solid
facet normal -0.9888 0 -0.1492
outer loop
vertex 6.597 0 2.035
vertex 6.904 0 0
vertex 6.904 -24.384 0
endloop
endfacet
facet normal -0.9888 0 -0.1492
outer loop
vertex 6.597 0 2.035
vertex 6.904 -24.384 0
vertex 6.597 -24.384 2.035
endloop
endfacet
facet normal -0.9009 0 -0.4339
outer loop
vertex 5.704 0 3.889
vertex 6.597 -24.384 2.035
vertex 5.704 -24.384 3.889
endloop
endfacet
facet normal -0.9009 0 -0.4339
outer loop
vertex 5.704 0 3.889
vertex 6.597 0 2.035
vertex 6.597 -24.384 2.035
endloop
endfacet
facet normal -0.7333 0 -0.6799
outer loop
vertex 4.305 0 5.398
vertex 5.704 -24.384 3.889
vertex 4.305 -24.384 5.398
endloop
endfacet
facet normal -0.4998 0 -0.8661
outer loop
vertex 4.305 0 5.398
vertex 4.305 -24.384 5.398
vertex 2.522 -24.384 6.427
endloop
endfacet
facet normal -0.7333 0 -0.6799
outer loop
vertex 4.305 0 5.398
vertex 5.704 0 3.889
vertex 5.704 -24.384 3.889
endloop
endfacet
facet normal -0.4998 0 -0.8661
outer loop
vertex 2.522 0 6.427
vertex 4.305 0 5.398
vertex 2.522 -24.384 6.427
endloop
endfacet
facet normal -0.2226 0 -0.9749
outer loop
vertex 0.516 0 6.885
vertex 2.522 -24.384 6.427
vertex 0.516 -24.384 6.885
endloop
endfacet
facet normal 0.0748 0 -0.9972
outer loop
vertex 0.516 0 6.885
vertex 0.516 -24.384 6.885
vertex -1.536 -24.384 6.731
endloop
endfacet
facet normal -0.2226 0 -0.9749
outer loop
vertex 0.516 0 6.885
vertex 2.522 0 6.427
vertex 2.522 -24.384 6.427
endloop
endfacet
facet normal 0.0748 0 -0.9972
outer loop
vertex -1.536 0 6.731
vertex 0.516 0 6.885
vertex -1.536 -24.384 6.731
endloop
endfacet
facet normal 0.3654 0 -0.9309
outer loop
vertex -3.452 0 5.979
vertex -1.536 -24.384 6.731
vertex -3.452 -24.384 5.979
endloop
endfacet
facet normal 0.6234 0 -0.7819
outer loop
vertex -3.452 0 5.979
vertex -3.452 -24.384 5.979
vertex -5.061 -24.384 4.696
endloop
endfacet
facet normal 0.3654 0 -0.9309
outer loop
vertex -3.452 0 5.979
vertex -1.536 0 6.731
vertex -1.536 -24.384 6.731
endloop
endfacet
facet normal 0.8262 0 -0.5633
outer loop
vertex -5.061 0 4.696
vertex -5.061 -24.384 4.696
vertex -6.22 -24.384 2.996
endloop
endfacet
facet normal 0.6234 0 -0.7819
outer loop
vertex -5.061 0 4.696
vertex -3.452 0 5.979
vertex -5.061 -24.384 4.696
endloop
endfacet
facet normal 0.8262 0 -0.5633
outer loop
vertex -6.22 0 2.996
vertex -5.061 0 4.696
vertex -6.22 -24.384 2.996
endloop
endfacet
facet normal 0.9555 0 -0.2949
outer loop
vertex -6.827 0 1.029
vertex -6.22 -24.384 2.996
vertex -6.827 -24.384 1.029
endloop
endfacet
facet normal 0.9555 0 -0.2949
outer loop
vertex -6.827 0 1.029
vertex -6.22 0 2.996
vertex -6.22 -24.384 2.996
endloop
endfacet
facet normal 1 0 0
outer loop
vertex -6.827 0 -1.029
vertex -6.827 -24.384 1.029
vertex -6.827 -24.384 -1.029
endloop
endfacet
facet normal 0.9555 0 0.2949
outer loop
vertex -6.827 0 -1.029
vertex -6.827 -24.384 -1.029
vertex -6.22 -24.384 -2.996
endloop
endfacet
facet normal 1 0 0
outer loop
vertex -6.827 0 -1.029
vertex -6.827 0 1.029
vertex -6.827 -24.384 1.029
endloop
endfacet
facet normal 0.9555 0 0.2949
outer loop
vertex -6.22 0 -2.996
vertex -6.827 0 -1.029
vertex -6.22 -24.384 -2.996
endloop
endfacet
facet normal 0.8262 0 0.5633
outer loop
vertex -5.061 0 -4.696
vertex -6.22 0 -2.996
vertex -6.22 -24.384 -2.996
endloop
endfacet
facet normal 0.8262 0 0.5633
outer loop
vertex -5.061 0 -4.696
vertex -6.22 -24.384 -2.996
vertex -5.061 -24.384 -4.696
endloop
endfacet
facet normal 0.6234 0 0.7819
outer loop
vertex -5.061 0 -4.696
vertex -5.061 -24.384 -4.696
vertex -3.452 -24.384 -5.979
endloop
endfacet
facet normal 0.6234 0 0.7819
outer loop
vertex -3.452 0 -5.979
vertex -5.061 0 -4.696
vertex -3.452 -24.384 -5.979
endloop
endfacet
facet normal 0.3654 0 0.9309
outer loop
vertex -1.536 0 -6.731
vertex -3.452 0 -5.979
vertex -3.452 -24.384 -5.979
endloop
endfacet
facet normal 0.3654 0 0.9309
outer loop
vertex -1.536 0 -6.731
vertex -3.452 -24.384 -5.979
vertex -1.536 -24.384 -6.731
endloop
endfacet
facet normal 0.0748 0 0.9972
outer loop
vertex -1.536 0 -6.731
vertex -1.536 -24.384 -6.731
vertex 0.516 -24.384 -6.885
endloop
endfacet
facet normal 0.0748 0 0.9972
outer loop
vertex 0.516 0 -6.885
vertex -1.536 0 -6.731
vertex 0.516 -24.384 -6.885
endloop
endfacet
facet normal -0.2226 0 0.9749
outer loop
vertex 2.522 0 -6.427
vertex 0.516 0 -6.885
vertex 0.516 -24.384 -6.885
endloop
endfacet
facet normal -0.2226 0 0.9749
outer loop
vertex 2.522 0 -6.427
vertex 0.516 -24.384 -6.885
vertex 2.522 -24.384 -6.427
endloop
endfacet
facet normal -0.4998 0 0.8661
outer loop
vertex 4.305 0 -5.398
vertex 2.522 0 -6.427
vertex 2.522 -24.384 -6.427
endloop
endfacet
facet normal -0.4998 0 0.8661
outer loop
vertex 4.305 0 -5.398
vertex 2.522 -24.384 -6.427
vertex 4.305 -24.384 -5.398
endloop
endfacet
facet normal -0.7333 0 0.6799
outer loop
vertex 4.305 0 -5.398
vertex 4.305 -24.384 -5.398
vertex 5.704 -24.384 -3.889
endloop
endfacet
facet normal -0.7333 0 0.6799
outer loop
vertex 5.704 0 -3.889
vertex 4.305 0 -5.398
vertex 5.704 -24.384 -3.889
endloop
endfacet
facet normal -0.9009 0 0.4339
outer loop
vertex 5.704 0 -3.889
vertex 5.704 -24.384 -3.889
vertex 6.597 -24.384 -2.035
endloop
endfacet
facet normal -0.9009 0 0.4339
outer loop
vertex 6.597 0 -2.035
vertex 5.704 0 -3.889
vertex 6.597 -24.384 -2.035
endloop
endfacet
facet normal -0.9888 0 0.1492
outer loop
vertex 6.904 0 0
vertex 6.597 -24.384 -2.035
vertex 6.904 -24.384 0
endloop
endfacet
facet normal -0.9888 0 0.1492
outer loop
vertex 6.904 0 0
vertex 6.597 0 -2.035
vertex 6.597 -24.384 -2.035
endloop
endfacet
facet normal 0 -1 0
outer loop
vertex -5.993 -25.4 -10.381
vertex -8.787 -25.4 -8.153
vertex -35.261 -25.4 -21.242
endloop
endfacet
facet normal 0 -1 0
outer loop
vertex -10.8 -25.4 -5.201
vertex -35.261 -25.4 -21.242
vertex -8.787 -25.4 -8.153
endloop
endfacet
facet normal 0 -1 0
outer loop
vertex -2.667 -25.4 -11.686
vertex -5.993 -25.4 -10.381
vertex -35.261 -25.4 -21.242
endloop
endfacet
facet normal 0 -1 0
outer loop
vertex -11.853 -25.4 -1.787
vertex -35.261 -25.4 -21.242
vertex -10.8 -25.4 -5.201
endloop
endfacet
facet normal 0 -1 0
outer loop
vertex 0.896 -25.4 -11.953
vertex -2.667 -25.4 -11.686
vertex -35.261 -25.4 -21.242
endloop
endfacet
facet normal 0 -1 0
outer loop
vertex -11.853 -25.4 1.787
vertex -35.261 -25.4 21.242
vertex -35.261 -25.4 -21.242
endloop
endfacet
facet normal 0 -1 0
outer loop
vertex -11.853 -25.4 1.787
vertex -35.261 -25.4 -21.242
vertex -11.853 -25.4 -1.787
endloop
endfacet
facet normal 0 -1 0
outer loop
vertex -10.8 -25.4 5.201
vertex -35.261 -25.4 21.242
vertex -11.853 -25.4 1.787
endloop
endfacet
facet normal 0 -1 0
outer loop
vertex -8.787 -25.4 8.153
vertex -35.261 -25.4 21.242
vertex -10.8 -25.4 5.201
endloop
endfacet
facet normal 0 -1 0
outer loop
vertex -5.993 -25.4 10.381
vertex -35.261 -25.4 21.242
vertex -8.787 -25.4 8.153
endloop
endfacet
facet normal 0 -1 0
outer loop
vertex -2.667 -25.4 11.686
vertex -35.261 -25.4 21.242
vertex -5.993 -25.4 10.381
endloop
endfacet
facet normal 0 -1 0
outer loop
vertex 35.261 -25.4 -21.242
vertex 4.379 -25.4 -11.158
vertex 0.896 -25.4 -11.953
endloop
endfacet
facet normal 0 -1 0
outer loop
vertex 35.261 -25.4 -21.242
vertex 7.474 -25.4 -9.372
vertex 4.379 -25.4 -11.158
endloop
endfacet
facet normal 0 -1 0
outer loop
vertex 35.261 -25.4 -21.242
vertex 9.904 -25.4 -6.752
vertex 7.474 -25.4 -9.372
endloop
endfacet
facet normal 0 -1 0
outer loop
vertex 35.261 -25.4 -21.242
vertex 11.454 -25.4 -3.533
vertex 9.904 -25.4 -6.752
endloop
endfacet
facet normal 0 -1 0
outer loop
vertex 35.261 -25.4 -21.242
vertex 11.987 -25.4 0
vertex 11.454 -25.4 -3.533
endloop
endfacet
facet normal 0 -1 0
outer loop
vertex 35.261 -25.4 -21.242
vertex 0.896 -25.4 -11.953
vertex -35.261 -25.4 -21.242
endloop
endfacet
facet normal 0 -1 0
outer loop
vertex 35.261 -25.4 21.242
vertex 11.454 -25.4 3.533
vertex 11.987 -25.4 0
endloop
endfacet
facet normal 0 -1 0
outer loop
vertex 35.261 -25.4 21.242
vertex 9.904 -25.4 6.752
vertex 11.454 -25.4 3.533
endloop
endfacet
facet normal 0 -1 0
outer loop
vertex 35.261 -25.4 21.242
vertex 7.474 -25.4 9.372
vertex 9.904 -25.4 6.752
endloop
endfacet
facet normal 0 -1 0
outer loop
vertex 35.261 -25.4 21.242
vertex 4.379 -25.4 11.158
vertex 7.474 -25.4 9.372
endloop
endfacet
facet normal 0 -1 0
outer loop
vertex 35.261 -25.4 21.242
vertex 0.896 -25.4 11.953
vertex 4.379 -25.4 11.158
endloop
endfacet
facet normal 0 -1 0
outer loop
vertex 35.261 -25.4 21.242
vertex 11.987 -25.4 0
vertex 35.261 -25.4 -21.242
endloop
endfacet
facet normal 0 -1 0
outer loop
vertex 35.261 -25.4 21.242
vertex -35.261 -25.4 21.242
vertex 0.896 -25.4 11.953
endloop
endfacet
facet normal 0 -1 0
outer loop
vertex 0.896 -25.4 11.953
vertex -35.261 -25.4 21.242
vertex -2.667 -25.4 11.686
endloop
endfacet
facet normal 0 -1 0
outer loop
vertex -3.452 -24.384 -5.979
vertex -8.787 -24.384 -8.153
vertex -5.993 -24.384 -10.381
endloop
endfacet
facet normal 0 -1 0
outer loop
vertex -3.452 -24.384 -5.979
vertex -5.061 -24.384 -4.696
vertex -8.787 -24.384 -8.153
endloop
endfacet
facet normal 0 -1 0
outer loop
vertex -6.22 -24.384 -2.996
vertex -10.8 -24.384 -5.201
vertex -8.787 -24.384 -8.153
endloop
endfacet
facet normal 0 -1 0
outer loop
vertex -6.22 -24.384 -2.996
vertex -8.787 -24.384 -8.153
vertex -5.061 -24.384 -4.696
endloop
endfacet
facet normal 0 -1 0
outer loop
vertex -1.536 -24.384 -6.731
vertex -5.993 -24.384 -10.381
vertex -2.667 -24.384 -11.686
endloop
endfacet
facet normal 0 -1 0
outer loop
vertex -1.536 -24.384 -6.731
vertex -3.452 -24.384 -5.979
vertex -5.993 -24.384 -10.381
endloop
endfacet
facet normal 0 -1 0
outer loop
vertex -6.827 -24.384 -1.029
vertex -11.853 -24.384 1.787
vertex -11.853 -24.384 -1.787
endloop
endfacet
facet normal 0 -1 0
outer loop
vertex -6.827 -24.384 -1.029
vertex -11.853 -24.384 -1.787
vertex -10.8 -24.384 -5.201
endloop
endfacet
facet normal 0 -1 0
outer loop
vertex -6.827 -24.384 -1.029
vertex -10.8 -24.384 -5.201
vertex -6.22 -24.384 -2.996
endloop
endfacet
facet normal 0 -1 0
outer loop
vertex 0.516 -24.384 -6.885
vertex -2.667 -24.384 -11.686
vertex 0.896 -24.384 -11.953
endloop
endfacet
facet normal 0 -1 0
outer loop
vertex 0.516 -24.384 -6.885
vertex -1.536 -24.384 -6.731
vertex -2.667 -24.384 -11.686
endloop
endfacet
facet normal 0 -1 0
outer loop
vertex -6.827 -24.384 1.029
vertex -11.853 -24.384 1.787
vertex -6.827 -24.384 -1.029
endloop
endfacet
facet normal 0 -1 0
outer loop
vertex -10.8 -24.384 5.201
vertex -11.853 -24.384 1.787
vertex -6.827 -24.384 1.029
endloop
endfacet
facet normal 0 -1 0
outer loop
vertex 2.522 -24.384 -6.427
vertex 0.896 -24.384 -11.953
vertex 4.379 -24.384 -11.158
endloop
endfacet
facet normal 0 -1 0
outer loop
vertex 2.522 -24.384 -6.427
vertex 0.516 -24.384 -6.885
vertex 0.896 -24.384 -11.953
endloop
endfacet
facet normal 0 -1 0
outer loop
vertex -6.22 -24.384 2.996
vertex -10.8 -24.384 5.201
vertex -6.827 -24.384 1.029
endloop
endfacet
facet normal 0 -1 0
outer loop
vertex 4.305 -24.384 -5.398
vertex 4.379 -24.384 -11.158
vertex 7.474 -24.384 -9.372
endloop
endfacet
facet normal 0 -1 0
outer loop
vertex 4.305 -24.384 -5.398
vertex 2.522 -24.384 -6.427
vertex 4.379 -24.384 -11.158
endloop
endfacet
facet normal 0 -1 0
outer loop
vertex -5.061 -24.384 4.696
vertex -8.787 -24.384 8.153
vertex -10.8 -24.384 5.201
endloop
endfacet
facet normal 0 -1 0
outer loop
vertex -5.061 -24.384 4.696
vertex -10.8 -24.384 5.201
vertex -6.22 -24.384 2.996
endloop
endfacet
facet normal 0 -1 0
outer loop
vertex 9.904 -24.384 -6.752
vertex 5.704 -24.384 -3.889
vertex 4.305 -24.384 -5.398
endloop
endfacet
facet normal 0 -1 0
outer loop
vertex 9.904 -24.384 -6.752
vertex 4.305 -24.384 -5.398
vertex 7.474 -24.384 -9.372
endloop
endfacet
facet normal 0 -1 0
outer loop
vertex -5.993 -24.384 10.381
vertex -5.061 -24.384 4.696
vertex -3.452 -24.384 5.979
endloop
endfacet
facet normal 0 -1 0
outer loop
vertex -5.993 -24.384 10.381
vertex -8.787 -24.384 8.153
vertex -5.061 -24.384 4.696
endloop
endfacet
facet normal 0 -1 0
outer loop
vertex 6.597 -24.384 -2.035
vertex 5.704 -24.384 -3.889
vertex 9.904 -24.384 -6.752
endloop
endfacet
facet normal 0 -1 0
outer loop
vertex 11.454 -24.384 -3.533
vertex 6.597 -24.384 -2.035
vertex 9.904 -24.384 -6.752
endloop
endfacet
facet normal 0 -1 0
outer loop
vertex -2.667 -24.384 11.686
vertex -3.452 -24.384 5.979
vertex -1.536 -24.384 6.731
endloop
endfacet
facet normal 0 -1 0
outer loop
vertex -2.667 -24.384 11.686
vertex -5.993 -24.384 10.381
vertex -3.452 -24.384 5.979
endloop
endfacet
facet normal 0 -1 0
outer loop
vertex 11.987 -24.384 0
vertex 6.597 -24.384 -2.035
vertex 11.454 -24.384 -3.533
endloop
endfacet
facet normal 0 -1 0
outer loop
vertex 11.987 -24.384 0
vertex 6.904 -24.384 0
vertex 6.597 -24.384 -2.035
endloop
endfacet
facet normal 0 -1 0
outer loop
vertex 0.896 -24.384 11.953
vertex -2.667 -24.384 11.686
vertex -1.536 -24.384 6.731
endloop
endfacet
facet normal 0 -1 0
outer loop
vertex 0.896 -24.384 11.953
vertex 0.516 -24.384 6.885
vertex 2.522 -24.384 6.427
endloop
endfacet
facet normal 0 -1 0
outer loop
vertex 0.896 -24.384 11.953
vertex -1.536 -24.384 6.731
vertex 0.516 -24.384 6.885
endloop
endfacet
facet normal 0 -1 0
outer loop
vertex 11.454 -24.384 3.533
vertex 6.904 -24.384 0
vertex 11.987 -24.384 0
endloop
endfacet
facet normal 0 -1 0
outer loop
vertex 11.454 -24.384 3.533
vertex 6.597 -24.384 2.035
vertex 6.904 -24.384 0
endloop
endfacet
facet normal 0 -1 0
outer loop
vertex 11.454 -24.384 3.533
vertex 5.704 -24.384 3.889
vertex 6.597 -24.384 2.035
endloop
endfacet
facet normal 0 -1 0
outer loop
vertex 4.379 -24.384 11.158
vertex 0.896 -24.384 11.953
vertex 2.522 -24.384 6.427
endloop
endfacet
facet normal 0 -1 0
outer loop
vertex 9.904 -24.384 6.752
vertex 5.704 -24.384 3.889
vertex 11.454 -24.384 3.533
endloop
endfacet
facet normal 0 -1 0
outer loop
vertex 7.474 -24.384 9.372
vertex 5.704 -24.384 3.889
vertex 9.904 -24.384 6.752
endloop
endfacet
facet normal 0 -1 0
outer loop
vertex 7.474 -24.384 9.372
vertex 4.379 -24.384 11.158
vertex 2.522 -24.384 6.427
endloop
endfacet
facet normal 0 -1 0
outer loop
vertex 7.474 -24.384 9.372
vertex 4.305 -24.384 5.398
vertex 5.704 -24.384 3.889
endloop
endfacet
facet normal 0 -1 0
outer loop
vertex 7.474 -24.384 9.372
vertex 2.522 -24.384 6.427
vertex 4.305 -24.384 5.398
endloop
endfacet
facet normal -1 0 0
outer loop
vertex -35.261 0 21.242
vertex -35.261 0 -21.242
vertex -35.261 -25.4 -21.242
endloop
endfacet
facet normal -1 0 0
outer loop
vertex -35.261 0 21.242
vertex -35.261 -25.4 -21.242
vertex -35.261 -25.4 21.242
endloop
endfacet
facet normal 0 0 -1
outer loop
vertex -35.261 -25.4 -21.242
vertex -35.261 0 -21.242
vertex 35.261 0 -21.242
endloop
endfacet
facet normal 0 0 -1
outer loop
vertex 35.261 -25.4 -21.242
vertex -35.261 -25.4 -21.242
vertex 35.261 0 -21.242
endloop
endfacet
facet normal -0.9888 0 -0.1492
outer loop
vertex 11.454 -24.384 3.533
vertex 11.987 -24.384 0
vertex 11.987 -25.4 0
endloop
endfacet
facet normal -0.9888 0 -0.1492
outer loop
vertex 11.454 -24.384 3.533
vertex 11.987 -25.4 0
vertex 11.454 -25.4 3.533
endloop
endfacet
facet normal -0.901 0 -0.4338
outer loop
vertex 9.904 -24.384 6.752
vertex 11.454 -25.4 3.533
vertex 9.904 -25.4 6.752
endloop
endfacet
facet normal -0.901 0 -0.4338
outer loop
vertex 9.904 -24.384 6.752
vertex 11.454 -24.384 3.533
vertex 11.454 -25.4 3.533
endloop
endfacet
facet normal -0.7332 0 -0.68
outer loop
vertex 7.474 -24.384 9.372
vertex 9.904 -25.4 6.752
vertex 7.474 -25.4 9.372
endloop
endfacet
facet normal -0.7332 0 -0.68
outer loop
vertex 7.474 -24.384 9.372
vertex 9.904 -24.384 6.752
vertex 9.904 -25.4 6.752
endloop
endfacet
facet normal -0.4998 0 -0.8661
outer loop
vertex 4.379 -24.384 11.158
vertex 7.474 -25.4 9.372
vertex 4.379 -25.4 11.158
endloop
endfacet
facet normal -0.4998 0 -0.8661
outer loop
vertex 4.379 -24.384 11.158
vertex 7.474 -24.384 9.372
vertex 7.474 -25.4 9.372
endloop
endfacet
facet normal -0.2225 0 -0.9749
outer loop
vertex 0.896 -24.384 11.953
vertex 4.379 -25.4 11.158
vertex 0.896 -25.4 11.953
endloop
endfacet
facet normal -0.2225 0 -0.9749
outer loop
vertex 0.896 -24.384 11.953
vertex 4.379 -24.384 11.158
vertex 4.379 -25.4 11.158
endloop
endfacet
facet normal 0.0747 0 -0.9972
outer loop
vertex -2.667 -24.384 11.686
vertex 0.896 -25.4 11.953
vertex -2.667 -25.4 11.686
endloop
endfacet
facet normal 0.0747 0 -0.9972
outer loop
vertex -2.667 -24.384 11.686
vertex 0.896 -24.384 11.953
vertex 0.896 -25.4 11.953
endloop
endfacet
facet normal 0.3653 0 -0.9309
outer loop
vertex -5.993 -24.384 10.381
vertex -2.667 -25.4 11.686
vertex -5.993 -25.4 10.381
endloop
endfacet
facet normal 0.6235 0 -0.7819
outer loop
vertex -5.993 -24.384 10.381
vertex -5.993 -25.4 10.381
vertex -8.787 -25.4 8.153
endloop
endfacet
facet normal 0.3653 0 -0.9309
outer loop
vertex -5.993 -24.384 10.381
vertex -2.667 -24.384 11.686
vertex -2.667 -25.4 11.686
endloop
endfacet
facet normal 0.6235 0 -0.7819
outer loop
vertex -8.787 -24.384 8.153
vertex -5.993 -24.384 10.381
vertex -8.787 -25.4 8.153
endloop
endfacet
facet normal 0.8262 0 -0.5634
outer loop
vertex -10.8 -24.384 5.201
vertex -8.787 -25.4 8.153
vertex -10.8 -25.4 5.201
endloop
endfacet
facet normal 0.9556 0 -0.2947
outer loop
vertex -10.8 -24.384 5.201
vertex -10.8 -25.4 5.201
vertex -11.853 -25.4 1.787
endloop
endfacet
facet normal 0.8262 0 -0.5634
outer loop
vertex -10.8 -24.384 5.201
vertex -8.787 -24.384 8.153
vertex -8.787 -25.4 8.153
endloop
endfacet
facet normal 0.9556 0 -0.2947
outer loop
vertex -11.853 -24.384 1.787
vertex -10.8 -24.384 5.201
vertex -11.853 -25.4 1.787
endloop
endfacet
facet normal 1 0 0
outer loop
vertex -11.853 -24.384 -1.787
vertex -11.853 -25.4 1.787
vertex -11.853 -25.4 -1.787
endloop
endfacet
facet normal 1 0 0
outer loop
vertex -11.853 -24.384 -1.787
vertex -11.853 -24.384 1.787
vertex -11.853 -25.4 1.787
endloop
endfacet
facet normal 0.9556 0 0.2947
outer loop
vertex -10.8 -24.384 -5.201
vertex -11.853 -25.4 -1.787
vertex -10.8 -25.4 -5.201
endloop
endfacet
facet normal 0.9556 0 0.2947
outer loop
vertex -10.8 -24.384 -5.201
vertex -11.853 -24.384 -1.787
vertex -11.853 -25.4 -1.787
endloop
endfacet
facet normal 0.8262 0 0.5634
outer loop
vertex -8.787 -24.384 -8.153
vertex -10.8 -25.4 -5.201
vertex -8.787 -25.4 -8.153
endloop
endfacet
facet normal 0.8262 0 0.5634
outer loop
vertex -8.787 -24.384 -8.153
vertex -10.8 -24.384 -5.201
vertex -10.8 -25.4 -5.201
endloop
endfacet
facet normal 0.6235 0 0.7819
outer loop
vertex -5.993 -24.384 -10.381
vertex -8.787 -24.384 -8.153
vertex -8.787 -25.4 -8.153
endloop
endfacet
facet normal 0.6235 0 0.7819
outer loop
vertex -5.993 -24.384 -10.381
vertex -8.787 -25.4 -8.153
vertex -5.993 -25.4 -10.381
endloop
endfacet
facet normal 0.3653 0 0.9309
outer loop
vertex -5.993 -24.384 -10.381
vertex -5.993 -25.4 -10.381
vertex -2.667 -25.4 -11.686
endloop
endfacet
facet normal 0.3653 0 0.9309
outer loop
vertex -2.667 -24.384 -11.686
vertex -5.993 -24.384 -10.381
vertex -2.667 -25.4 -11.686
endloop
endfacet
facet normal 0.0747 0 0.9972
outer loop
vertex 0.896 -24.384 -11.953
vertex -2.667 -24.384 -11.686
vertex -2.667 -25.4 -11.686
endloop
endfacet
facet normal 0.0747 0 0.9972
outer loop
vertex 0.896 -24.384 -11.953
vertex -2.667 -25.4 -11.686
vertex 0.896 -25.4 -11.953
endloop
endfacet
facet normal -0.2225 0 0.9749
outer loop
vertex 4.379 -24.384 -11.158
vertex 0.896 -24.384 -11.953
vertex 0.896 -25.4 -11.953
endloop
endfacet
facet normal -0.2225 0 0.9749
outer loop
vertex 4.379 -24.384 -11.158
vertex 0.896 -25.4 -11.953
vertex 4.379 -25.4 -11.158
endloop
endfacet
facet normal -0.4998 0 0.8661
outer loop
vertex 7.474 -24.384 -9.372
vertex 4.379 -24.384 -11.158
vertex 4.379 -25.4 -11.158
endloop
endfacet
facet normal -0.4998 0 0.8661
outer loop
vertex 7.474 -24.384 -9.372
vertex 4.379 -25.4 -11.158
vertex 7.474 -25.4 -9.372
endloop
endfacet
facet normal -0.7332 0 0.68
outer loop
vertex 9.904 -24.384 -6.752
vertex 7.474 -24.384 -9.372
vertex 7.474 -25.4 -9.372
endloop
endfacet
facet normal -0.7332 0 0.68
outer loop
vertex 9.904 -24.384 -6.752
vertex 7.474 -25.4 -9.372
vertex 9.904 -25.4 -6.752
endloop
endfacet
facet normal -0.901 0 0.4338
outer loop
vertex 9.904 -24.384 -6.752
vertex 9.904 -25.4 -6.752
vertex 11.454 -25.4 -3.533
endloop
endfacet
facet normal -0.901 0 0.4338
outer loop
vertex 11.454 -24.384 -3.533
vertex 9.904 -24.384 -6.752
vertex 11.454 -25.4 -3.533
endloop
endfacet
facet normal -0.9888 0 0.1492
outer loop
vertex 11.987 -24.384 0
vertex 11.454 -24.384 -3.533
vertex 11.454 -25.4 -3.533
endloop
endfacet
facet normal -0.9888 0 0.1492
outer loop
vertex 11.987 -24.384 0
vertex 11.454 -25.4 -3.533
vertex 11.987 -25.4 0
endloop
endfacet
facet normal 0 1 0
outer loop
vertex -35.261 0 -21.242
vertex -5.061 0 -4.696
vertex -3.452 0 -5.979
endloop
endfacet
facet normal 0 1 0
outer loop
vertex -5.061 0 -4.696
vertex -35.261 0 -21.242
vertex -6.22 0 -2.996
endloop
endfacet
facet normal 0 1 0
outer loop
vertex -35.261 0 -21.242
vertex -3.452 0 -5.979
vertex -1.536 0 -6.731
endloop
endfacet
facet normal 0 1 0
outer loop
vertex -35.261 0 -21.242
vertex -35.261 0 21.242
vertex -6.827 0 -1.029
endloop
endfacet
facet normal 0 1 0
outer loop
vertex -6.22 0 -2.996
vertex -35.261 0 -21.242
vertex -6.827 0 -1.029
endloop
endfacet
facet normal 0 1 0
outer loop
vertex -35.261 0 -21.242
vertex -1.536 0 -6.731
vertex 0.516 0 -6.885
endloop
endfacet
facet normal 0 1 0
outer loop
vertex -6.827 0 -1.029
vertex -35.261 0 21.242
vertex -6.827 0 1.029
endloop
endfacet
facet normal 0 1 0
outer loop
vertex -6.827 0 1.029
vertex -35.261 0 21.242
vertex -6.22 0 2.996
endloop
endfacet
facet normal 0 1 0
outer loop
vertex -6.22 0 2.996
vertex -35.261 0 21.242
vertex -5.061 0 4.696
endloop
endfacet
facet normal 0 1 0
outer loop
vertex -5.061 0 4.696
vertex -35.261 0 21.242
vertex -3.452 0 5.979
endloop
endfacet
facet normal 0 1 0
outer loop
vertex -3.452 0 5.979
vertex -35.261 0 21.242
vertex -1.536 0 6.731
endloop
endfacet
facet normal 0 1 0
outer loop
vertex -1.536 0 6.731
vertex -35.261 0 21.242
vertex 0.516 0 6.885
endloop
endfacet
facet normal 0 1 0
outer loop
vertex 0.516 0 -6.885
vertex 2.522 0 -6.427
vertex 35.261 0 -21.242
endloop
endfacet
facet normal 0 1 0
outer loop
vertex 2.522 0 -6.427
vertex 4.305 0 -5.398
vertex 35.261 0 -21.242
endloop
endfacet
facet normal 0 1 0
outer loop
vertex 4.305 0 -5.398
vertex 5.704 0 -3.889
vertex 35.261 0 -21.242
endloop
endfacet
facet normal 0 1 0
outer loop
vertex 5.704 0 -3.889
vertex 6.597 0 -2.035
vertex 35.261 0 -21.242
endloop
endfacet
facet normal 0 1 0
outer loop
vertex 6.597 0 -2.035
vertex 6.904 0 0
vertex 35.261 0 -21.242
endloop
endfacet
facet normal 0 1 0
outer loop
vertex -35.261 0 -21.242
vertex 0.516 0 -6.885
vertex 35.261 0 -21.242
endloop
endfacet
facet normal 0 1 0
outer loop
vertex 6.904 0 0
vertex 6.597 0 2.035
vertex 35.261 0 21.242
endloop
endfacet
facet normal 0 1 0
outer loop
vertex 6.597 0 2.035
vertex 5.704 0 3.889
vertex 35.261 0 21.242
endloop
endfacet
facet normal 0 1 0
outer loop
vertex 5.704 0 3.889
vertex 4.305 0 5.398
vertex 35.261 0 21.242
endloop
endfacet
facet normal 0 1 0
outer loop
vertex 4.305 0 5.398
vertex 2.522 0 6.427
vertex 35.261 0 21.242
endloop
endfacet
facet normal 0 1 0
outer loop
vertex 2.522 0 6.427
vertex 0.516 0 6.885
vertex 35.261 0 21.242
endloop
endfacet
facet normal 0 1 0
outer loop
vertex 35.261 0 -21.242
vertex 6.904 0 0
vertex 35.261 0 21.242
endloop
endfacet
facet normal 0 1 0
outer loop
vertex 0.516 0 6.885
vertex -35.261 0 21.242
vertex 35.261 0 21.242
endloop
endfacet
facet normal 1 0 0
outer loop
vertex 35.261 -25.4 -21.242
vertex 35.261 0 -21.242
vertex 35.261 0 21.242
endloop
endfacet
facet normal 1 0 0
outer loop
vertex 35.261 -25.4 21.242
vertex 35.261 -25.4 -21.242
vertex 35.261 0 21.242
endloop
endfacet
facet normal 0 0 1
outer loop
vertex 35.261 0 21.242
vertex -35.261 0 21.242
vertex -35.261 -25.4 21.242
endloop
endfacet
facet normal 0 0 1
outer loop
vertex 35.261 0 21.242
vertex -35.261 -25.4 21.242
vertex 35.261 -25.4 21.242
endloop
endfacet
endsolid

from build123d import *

# Parameters (mm, degrees)
F0_R     = 11.9868187185
F0_R_2   = 6.9041541384
F1_DEPTH = 24.384
F0_W     = 70.5220922828
F0_H     = 42.4831844866
F2_DEPTH = 25.4


# Not quite as in the source:
# - the program builds the solid bodies; features that only make, move or delete a surface that nothing else refers to are left out


with BuildPart() as f1:
    # F0 (on Front) → F1 (new body)
    with BuildSketch(Plane.XZ):
        Circle(F0_R)
        Circle(F0_R_2, mode=Mode.SUBTRACT)
    extrude(amount=F1_DEPTH)

    # F0 (on Front) → F2 (join)
    with BuildSketch(Plane.XZ):
        Rectangle(F0_W, F0_H)
        Circle(F0_R, mode=Mode.SUBTRACT)
    extrude(amount=F2_DEPTH)


solid = f1.part
